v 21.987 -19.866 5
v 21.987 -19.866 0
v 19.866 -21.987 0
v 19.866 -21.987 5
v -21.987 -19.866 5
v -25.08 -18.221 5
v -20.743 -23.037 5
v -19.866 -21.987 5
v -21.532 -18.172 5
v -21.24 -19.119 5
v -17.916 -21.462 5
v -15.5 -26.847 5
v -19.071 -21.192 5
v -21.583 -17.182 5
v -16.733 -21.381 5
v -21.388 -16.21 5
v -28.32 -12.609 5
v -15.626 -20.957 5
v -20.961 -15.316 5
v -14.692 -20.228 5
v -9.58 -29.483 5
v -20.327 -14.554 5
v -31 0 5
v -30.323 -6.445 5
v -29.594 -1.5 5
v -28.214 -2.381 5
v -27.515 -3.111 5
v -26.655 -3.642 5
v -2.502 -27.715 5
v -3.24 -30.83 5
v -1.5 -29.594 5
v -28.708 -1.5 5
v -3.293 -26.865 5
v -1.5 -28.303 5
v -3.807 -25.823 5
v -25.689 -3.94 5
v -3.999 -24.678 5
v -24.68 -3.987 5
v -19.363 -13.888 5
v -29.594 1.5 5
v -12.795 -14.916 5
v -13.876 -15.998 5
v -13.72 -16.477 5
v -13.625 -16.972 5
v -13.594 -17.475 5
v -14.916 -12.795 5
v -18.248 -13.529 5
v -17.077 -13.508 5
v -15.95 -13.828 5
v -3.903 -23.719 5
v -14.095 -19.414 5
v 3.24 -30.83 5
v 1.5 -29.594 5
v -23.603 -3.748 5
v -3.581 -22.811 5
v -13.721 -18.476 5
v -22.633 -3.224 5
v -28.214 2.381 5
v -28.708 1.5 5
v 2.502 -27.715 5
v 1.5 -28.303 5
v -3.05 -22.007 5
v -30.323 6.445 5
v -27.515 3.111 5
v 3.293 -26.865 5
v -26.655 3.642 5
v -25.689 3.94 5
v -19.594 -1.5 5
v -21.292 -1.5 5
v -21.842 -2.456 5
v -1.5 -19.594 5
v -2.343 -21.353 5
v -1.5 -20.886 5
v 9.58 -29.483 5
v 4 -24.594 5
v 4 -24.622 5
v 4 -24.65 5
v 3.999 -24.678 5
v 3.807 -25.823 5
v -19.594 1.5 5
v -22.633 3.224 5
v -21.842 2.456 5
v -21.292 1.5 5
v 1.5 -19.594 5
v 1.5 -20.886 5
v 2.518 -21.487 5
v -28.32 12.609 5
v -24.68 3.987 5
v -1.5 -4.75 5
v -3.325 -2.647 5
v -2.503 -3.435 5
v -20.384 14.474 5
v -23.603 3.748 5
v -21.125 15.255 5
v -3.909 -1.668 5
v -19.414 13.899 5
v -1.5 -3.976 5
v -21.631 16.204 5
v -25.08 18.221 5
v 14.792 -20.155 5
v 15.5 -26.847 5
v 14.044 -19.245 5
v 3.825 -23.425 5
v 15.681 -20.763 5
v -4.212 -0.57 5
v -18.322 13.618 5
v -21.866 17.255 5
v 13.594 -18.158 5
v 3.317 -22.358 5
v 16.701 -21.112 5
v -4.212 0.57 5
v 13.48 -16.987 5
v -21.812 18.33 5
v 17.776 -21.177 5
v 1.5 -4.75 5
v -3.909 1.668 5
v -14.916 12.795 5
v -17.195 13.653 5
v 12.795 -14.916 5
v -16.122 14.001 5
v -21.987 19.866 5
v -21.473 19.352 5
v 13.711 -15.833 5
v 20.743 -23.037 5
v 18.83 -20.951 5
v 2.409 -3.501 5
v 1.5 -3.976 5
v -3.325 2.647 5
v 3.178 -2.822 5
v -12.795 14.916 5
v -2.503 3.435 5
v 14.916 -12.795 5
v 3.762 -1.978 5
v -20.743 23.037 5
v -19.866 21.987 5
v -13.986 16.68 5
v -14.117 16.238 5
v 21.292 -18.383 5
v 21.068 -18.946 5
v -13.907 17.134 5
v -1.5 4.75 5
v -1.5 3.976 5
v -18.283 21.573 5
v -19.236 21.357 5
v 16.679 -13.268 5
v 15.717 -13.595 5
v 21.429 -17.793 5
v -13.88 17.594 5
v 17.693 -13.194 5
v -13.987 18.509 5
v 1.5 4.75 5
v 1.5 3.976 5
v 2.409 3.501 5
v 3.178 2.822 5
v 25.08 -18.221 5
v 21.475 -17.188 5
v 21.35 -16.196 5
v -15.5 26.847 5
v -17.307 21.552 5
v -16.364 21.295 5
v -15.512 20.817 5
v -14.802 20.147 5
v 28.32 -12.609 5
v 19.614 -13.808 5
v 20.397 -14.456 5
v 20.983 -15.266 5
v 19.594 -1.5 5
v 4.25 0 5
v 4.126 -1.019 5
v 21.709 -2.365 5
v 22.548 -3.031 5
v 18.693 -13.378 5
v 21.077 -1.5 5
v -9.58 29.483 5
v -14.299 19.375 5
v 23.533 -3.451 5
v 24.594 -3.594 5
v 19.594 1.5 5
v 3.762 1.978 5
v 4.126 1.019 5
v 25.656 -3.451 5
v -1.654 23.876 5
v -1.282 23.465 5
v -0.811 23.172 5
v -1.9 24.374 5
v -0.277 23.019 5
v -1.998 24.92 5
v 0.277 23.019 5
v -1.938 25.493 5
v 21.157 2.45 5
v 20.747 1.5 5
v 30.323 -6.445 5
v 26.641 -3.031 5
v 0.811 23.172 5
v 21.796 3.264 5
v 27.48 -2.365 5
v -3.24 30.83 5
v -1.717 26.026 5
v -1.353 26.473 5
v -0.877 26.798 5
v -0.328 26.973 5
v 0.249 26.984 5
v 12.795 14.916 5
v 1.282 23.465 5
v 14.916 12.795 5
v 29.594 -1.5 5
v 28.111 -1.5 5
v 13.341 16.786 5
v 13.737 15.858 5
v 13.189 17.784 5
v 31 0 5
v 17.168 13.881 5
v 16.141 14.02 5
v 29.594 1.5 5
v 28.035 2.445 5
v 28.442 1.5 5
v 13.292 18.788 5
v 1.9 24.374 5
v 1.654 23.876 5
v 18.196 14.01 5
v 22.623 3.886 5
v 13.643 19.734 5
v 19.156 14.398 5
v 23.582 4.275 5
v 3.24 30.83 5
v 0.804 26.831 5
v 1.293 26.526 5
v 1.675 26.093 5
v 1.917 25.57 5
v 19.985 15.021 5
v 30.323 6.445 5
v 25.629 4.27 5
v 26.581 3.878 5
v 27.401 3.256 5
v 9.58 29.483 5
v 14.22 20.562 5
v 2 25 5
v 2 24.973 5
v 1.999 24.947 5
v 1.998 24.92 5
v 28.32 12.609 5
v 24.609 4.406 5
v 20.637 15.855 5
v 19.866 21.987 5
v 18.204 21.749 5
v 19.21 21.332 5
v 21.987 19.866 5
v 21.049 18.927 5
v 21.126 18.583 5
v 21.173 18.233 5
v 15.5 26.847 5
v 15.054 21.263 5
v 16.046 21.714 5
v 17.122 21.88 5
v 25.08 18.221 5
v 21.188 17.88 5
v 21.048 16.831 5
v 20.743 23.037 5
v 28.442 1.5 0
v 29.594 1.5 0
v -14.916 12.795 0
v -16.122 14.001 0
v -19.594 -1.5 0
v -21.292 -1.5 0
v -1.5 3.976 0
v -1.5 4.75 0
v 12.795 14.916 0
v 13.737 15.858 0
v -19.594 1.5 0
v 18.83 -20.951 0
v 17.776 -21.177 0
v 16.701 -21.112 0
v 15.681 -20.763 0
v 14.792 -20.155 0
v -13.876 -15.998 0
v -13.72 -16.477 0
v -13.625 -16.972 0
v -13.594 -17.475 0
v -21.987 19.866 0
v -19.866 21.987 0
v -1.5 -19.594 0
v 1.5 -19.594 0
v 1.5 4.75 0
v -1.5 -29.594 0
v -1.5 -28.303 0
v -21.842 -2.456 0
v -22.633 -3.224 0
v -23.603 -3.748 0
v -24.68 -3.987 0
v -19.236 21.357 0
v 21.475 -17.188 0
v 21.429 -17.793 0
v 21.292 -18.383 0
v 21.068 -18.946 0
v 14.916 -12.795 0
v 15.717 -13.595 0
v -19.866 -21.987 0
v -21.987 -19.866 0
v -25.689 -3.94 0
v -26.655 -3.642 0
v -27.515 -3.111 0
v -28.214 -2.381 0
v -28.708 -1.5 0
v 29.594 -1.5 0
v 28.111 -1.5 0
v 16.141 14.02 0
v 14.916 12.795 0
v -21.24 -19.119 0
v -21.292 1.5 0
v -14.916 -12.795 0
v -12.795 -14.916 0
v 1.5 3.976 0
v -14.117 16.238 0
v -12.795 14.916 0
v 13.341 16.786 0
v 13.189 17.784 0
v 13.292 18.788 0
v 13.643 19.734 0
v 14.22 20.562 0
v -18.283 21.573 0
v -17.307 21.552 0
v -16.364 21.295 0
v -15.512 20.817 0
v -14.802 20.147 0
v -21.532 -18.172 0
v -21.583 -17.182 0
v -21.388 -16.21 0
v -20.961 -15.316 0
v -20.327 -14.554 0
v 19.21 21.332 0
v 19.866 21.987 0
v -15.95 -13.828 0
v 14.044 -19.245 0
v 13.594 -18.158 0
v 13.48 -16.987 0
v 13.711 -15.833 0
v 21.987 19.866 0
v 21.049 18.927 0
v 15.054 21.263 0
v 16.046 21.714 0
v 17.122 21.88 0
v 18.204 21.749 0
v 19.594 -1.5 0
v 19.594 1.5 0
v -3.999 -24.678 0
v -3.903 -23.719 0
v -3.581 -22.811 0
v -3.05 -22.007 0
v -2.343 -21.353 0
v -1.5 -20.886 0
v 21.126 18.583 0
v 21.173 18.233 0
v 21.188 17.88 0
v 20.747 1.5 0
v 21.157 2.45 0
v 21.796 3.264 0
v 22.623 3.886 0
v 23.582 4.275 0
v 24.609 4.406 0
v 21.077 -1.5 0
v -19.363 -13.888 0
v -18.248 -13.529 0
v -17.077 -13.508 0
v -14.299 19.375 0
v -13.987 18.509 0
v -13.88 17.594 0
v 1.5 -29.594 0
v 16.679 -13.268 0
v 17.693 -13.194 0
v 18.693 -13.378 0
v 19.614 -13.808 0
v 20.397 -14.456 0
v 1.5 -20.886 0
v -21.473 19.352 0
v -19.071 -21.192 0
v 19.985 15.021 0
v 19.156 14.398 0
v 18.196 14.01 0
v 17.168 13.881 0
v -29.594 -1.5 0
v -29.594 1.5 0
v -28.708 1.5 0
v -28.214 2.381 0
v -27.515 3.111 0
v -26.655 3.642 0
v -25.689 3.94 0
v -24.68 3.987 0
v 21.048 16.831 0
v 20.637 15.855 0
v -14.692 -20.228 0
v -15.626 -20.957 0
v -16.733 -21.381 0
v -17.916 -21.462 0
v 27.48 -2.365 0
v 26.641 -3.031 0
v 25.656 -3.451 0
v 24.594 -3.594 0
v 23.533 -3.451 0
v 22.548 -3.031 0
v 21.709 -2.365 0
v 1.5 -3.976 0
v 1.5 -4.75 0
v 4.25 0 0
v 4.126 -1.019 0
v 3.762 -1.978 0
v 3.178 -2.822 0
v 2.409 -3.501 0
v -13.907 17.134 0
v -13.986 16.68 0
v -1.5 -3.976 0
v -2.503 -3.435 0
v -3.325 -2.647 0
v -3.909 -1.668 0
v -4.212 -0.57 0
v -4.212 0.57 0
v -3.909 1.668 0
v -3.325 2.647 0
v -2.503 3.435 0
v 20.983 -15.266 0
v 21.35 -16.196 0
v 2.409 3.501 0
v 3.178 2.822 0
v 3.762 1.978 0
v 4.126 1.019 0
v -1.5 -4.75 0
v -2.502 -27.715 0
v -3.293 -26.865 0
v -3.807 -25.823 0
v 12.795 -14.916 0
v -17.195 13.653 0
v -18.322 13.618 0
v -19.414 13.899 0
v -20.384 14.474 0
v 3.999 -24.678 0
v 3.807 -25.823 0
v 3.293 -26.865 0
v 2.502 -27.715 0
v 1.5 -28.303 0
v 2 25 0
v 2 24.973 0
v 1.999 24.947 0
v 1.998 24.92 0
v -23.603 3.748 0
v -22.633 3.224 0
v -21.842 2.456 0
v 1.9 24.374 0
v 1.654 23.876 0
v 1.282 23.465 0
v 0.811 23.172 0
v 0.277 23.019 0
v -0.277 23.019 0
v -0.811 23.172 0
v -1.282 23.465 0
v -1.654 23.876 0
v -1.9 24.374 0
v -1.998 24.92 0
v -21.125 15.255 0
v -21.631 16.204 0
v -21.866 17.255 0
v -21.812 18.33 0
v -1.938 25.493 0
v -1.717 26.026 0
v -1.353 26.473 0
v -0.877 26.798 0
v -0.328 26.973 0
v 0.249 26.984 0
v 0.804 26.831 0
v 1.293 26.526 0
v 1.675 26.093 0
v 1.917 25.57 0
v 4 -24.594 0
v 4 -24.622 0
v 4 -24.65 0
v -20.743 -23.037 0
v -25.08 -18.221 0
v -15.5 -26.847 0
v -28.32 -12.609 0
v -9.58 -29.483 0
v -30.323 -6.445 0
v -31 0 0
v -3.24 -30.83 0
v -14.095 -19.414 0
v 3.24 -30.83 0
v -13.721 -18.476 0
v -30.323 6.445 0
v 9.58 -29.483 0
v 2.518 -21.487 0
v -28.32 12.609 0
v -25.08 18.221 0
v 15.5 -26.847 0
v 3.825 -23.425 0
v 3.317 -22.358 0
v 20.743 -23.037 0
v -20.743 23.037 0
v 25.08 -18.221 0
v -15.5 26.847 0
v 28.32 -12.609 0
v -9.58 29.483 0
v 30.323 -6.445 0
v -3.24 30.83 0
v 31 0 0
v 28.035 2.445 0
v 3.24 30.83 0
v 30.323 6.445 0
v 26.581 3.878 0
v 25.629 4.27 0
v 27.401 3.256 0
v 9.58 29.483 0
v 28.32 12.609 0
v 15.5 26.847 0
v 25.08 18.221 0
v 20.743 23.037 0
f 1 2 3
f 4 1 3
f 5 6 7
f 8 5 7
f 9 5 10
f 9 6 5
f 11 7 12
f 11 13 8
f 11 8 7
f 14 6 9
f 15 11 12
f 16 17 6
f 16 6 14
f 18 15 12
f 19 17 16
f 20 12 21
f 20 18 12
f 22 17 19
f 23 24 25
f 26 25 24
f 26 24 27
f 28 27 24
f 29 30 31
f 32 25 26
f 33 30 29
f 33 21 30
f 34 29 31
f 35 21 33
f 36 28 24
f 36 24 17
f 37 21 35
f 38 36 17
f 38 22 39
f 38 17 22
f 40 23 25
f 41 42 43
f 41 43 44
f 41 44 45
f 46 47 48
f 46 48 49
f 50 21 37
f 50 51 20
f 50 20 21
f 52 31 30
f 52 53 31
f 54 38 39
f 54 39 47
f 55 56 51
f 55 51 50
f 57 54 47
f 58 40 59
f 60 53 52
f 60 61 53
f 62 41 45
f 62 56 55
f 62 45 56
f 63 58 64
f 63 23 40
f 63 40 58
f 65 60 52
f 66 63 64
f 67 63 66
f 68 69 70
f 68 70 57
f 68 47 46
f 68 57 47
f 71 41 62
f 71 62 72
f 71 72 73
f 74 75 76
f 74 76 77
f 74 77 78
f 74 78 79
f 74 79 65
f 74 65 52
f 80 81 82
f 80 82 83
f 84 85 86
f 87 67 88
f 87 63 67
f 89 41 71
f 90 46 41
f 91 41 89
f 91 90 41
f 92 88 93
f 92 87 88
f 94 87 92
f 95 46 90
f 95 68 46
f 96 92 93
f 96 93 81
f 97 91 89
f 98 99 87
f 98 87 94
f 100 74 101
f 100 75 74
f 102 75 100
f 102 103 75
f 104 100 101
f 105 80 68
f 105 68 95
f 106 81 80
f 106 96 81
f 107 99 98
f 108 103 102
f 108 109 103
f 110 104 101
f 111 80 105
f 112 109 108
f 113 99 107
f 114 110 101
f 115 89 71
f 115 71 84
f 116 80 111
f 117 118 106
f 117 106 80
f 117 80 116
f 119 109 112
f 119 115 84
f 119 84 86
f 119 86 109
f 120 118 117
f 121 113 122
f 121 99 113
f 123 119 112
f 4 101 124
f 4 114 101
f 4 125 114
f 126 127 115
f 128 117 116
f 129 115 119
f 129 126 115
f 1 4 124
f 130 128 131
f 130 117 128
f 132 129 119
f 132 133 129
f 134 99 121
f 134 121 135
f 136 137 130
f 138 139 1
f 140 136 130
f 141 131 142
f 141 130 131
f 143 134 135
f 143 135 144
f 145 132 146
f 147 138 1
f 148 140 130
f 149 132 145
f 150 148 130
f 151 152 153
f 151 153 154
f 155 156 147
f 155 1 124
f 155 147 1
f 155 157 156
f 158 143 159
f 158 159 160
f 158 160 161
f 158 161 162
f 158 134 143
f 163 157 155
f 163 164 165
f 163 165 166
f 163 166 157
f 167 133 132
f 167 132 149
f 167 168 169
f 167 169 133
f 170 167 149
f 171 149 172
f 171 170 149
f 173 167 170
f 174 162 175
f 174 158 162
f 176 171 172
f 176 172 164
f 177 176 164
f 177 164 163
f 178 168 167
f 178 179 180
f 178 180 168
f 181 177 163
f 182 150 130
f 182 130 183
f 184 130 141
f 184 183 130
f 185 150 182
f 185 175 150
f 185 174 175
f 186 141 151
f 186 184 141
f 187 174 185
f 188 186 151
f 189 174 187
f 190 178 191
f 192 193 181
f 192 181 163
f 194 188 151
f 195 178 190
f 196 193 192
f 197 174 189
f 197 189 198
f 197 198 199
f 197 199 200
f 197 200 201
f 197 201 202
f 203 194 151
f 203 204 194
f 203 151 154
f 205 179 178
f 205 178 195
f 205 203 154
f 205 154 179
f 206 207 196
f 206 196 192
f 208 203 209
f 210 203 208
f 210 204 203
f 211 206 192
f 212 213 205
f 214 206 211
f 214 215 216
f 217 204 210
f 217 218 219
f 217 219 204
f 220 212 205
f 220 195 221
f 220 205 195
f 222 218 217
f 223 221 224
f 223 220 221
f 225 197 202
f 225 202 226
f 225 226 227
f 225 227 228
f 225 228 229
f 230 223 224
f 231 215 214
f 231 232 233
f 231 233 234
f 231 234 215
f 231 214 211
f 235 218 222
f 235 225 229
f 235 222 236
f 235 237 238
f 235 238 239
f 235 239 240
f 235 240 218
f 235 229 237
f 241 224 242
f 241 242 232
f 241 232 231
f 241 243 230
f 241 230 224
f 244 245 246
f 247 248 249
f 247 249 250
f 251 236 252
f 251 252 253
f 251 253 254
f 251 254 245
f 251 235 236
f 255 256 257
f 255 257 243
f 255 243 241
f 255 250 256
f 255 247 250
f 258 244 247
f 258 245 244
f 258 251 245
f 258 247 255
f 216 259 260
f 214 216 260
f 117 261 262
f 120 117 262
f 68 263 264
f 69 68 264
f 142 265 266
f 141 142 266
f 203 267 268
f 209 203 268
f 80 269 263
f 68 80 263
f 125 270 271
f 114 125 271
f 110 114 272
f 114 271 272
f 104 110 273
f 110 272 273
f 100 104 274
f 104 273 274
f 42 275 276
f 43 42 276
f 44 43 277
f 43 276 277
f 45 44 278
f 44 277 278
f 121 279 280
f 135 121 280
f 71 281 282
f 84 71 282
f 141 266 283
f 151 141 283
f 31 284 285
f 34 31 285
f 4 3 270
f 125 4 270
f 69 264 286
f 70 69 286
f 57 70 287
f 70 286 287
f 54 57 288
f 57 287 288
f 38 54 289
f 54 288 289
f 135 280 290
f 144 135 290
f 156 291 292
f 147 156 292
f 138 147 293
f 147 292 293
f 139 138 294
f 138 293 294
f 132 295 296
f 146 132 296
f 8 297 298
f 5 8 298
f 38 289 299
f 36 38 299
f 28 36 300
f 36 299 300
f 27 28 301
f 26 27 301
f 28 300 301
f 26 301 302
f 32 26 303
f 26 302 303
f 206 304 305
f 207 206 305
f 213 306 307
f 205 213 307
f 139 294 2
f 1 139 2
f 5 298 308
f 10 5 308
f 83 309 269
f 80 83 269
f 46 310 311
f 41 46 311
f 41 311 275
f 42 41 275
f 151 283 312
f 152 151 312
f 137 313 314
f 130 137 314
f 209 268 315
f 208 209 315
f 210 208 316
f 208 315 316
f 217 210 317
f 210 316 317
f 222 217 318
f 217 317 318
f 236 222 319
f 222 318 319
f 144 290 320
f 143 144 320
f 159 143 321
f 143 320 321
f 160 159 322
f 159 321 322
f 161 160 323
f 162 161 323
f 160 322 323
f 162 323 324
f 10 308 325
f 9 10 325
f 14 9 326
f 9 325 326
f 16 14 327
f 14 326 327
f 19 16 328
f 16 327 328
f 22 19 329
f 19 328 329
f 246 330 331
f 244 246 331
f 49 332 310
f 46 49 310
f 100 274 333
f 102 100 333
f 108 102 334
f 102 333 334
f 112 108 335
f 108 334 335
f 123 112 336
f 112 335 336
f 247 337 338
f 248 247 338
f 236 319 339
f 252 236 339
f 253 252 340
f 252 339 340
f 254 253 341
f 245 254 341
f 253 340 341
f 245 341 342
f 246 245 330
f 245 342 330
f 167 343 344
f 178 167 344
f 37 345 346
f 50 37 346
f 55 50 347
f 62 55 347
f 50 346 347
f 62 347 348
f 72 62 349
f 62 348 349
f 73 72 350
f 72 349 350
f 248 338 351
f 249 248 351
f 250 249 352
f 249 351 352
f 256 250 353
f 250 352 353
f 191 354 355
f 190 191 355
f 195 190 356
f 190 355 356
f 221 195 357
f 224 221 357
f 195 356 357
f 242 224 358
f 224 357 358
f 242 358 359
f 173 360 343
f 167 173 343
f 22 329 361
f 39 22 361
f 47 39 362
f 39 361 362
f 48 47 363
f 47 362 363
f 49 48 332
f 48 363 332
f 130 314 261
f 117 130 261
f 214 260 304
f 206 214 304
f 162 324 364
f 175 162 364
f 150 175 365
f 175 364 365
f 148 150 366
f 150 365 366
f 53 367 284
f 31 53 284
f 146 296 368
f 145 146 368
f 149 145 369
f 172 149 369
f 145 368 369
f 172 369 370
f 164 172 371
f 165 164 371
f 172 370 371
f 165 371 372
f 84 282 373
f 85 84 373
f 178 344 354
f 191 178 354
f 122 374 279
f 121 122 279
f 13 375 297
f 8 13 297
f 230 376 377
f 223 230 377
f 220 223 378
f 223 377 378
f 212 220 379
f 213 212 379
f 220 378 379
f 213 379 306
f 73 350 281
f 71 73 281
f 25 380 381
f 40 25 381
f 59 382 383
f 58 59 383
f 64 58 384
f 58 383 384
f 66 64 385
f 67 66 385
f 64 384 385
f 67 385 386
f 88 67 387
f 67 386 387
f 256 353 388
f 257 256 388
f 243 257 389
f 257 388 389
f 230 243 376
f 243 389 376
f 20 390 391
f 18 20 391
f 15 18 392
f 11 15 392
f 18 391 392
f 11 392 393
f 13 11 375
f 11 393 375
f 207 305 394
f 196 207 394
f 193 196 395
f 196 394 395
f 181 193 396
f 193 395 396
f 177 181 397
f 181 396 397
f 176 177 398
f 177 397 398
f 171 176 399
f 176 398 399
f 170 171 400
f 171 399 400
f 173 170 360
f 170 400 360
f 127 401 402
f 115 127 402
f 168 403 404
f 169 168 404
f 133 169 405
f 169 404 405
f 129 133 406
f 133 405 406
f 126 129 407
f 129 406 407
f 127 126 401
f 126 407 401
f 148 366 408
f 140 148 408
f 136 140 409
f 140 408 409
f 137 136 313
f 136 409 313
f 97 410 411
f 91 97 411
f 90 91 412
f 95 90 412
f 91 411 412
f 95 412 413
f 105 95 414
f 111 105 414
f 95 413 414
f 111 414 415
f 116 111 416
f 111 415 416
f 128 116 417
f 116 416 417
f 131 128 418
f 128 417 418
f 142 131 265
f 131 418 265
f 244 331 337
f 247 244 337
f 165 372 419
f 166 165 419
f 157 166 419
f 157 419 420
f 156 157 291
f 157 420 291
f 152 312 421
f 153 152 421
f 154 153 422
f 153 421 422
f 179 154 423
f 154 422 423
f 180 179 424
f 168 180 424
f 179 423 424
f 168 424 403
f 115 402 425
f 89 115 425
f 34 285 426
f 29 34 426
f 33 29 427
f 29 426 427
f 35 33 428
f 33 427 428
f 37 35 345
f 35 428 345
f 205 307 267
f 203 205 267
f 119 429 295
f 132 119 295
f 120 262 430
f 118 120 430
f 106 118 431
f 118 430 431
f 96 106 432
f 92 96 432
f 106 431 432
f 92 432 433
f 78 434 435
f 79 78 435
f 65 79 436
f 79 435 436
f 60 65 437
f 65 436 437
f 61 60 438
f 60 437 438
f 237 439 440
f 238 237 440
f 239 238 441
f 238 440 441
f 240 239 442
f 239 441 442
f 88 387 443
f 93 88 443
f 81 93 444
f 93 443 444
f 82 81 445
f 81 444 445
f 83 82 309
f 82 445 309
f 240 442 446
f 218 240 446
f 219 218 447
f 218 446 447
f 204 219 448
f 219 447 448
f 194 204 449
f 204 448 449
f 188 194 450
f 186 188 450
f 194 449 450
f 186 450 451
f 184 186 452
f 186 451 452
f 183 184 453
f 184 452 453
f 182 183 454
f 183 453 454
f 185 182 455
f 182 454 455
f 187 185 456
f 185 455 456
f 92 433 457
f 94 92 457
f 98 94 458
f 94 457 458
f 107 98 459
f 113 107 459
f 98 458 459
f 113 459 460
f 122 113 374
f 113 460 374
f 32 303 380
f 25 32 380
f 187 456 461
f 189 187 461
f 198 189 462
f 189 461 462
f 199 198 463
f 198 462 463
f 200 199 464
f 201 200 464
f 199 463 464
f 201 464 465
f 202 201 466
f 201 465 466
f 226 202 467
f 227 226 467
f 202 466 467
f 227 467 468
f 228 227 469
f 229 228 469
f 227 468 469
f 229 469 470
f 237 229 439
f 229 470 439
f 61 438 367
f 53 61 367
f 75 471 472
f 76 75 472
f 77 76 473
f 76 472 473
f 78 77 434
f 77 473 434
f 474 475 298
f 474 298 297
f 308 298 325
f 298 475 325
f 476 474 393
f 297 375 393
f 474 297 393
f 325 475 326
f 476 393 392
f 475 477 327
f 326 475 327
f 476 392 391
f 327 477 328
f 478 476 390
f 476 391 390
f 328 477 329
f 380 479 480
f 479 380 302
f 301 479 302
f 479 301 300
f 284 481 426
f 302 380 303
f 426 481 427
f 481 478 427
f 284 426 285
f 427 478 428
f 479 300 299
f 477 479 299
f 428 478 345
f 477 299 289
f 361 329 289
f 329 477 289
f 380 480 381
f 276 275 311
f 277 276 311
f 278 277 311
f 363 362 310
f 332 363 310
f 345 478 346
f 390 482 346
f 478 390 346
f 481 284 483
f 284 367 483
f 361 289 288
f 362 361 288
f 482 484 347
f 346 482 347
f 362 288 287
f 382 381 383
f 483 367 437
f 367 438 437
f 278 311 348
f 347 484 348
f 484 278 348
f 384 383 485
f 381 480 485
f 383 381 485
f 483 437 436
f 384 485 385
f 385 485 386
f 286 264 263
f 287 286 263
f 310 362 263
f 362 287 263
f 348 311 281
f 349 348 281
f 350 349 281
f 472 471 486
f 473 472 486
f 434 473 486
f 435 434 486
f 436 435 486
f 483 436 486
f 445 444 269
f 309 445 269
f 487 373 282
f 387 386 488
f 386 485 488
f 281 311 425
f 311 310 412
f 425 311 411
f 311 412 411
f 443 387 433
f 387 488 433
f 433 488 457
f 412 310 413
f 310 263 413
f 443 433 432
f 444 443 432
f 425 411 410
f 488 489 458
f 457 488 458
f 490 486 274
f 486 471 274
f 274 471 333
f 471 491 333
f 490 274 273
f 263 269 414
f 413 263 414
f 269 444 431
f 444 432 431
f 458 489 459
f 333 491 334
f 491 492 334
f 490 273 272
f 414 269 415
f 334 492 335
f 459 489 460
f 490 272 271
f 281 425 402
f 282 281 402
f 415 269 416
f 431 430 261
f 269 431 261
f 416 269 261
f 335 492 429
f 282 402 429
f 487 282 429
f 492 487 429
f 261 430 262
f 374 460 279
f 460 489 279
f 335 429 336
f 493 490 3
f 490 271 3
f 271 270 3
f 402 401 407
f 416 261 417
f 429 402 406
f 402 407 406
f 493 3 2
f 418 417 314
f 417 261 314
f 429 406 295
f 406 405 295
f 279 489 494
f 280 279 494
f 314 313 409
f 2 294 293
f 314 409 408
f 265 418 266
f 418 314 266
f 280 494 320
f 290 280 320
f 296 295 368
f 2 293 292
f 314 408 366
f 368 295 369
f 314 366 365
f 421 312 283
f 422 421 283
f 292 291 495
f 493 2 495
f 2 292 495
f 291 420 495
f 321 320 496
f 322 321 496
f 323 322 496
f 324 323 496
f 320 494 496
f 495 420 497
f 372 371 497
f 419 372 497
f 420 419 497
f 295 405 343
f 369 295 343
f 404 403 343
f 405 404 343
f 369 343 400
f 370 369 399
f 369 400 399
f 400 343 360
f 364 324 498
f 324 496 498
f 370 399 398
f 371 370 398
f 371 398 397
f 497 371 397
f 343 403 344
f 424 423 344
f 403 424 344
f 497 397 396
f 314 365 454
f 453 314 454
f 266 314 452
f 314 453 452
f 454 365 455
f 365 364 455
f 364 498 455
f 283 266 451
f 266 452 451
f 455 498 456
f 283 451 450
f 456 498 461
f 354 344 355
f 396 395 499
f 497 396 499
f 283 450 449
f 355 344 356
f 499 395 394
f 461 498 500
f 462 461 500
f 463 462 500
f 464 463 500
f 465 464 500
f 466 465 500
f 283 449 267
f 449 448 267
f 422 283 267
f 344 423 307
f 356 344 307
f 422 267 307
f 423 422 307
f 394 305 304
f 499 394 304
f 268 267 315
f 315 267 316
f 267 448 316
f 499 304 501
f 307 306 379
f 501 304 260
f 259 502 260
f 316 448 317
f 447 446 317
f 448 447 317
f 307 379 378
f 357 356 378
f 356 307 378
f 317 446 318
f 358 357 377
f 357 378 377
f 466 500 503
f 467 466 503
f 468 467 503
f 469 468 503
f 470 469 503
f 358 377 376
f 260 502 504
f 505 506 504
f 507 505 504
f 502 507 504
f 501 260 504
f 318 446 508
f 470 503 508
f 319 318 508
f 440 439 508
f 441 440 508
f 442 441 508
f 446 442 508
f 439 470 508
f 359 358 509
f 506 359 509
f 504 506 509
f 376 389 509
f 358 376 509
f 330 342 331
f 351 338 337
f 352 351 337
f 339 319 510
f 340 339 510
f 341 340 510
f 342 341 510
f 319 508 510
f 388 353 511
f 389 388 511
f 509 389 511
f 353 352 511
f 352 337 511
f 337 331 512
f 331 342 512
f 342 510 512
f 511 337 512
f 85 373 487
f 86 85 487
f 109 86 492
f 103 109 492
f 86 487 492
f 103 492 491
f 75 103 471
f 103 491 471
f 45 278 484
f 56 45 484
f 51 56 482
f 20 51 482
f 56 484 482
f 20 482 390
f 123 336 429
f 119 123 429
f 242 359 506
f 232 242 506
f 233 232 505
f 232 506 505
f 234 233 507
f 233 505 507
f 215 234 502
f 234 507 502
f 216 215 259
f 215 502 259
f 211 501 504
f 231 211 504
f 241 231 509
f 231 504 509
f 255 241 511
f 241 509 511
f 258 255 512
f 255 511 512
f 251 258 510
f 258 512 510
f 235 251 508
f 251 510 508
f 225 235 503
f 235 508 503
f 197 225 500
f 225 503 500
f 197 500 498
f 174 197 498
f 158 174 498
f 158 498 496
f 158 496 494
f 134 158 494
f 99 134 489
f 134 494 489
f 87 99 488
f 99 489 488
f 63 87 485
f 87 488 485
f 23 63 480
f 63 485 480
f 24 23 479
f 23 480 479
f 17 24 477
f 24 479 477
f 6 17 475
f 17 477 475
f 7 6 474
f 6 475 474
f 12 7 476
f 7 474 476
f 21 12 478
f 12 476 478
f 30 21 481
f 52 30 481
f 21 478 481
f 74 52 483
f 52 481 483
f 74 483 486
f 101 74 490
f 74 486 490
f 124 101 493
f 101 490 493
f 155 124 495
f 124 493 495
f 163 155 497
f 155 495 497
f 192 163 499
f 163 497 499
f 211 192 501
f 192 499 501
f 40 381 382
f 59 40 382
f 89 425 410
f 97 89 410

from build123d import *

# Parameters (mm, degrees)
F0_R     = 31
F1_DEPTH = 5


with BuildPart() as f1:
    # F0 (on Top) → F1 (new body)
    with BuildSketch(Plane.XY):
        Circle(F0_R)
        with BuildLine():
            ThreePointArc((-28.7080992435, 1.5), (-27.1015041114, 3.4034806404), (-24.68, 3.9871794542))
            ThreePointArc((-24.68, 3.9871794542), (-23.1340148639, 9.4772019223), (-20.3839350968, 14.4739486654))
            ThreePointArc((-20.3839350968, 14.4739486654), (-21.7843066075, 16.7218663809), (-21.4732899684, 19.3519696248))
            Line((-21.4732899684, 19.3519696248), (-21.9870643658, 19.8657440223))
            Line((-21.9870643658, 19.8657440223), (-19.8657440223, 21.9870643658))
            Line((-19.8657440223, 21.9870643658), (-19.2357510946, 21.3570714382))
            ThreePointArc((-19.2357510946, 21.3570714382), (-16.8275788969, 21.4526090468), (-14.8016328487, 20.1472495644))
            ThreePointArc((-14.8016328487, 20.1472495644), (-8.7324141696, 23.4253056068), (-1.9983993595, 24.92))
            ThreePointArc((-1.9983993595, 24.92), (-0.0400080056, 26.9995997998), (2, 25))
            ThreePointArc((2, 25), (1.9995997998, 24.9599919944), (1.9983993595, 24.92))
            ThreePointArc((1.9983993595, 24.92), (8.396839067, 23.5476770337), (14.2199501873, 20.5619312485))
            ThreePointArc((14.2199501873, 20.5619312485), (16.578332036, 21.8337211242), (19.2103126472, 21.3316329908))
            Line((19.2103126472, 21.3316329908), (19.8657440223, 21.9870643658))
            Line((19.8657440223, 21.9870643658), (21.9870643658, 19.8657440223))
            Line((21.9870643658, 19.8657440223), (21.048652157, 18.9273318134))
            ThreePointArc((21.048652157, 18.9273318134), (21.1530642912, 18.408521084), (21.1880725996, 17.8804672182))
            ThreePointArc((21.1880725996, 17.8804672182), (20.8749504136, 16.3290382046), (19.9846066074, 15.020502613))
            ThreePointArc((19.9846066074, 15.020502613), (22.9196691944, 9.9844260737), (24.608757715, 4.4055696256))
            ThreePointArc((24.608757715, 4.4055696256), (27.0107687706, 3.5932566366), (28.4417775606, 1.5))
            Line((28.4417775606, 1.5), (29.5944046229, 1.5))
            Line((29.5944046229, 1.5), (29.5944046229, -1.5))
            Line((29.5944046229, -1.5), (28.1113217756, -1.5))
            ThreePointArc((28.1113217756, -1.5), (26.7035545193, -2.9931524386), (24.7406441339, -3.5917304797))
            ThreePointArc((24.7406441339, -3.5917304797), (23.2131665144, -9.2816431936), (20.3965858209, -14.4561158978))
            ThreePointArc((20.3965858209, -14.4561158978), (21.1955475808, -15.7195454325), (21.4748718411, -17.1880725996))
            ThreePointArc((21.4748718411, -17.1880725996), (21.3717482185, -18.0904885234), (21.0676945913, -18.9463742477))
            Line((21.0676945913, -18.9463742477), (21.9870643658, -19.8657440223))
            Line((21.9870643658, -19.8657440223), (19.8657440223, -21.9870643658))
            Line((19.8657440223, -21.9870643658), (18.8301557175, -20.9514760611))
            ThreePointArc((18.8301557175, -20.9514760611), (16.7005194557, -21.1124041838), (14.7916340459, -20.1545915923))
            ThreePointArc((14.7916340459, -20.1545915923), (9.6637784532, -23.0566993737), (3.9991249765, -24.6780671736))
            ThreePointArc((3.9991249765, -24.6780671736), (3.2930577298, -26.865036867), (1.5, -28.3025038665))
            Line((1.5, -28.3025038665), (1.5, -29.5944046229))
            Line((1.5, -29.5944046229), (-1.5, -29.5944046229))
            Line((-1.5, -29.5944046229), (-1.5, -28.3025038665))
            ThreePointArc((-1.5, -28.3025038665), (-3.2930577298, -26.865036867), (-3.9991249765, -24.6780671736))
            ThreePointArc((-3.9991249765, -24.6780671736), (-9.606613518, -23.0805757449), (-14.691565202, -20.2276521602))
            ThreePointArc((-14.691565202, -20.2276521602), (-16.7333297142, -21.3812535524), (-19.0708139147, -21.1921342582))
            Line((-19.0708139147, -21.1921342582), (-19.8657440223, -21.9870643658))
            Line((-19.8657440223, -21.9870643658), (-21.9870643658, -19.8657440223))
            Line((-21.9870643658, -19.8657440223), (-21.2402040172, -19.1188836736))
            ThreePointArc((-21.2402040172, -19.1188836736), (-21.5159012518, -16.6899602951), (-20.326723356, -14.5541855701))
            ThreePointArc((-20.326723356, -14.5541855701), (-23.115291289, -9.522778409), (-24.68, -3.9871794542))
            ThreePointArc((-24.68, -3.9871794542), (-27.1015041114, -3.4034806404), (-28.7080992435, -1.5))
            Line((-28.7080992435, -1.5), (-29.5944046229, -1.5))
            Line((-29.5944046229, -1.5), (-29.5944046229, 1.5))
            Line((-29.5944046229, 1.5), (-28.7080992435, 1.5))
        make_face(mode=Mode.SUBTRACT)
        with BuildLine():
            ThreePointArc((-24.68, 3.9871794542), (-22.6329530448, 3.2244516916), (-21.2919007565, 1.5))
            Line((-21.2919007565, 1.5), (-19.5944046229, 1.5))
            Line((-19.5944046229, 1.5), (-19.5944046229, -1.5))
            Line((-19.5944046229, -1.5), (-21.2919007565, -1.5))
            ThreePointArc((-21.2919007565, -1.5), (-22.6329530448, -3.2244516916), (-24.68, -3.9871794542))
            ThreePointArc((-24.68, -3.9871794542), (-23.115291289, -9.522778409), (-20.326723356, -14.5541855701))
            ThreePointArc((-20.326723356, -14.5541855701), (-18.2480519875, -13.5287621662), (-15.9496561442, -13.8283358006))
            Line((-15.9496561442, -13.8283358006), (-14.915996554, -12.7946762104))
            Line((-14.915996554, -12.7946762104), (-12.7946762104, -14.915996554))
            Line((-12.7946762104, -14.915996554), (-13.8764055595, -15.9977259031))
            ThreePointArc((-13.8764055595, -15.9977259031), (-13.664988194, -16.7228910131), (-13.5936679767, -17.4748718411))
            ThreePointArc((-13.5936679767, -17.4748718411), (-13.8782668477, -18.95669317), (-14.691565202, -20.2276521602))
            ThreePointArc((-14.691565202, -20.2276521602), (-9.606613518, -23.0805757449), (-3.9991249765, -24.6780671736))
            ThreePointArc((-3.9991249765, -24.6780671736), (-3.3398290754, -22.3931454952), (-1.5, -20.8863053794))
            Line((-1.5, -20.8863053794), (-1.5, -19.5944046229))
            Line((-1.5, -19.5944046229), (1.5, -19.5944046229))
            Line((1.5, -19.5944046229), (1.5, -20.8863053794))
            ThreePointArc((1.5, -20.8863053794), (3.3166247904, -22.3583366454), (4, -24.5944046229))
            ThreePointArc((4, -24.5944046229), (3.9997812381, -24.6362381861), (3.9991249765, -24.6780671736))
            ThreePointArc((3.9991249765, -24.6780671736), (9.6637784532, -23.0566993737), (14.7916340459, -20.1545915923))
            ThreePointArc((14.7916340459, -20.1545915923), (13.5942416238, -18.1579742011), (13.7114683796, -15.8327887231))
            Line((13.7114683796, -15.8327887231), (12.7946762104, -14.915996554))
            Line((12.7946762104, -14.915996554), (14.915996554, -12.7946762104))
            Line((14.915996554, -12.7946762104), (15.716570193, -13.5952498494))
            ThreePointArc((15.716570193, -13.5952498494), (18.1985117044, -13.2540739534), (20.3965858209, -14.4561158978))
            ThreePointArc((20.3965858209, -14.4561158978), (23.2131665144, -9.2816431936), (24.7406441339, -3.5917304797))
            ThreePointArc((24.7406441339, -3.5917304797), (22.6109225733, -3.0679905163), (21.0774874702, -1.5))
            Line((21.0774874702, -1.5), (19.5944046229, -1.5))
            Line((19.5944046229, -1.5), (19.5944046229, 1.5))
            Line((19.5944046229, 1.5), (20.7470316853, 1.5))
            ThreePointArc((20.7470316853, 1.5), (22.1894942303, 3.6019066891), (24.608757715, 4.4055696256))
            ThreePointArc((24.608757715, 4.4055696256), (22.9196691944, 9.9844260737), (19.9846066074, 15.020502613))
            ThreePointArc((19.9846066074, 15.020502613), (18.1958639143, 14.0095039446), (16.1412080043, 14.0198876608))
            Line((16.1412080043, 14.0198876608), (14.915996554, 12.7946762104))
            Line((14.915996554, 12.7946762104), (12.7946762104, 14.915996554))
            Line((12.7946762104, 14.915996554), (13.736906827, 15.8582271706))
            ThreePointArc((13.736906827, 15.8582271706), (13.2089994395, 18.2890951502), (14.2199501873, 20.5619312485))
            ThreePointArc((14.2199501873, 20.5619312485), (8.396839067, 23.5476770337), (1.9983993595, 24.92))
            ThreePointArc((1.9983993595, 24.92), (0, 23), (-1.9983993595, 24.92))
            ThreePointArc((-1.9983993595, 24.92), (-8.7324141696, 23.4253056068), (-14.8016328487, 20.1472495644))
            ThreePointArc((-14.8016328487, 20.1472495644), (-14.1177994493, 18.9509930155), (-13.8804672182, 17.5936679767))
            ThreePointArc((-13.8804672182, 17.5936679767), (-13.9400602693, 16.9057776679), (-14.1170637567, 16.2383841002))
            Line((-14.1170637567, 16.2383841002), (-12.7946762104, 14.915996554))
            Line((-12.7946762104, 14.915996554), (-14.915996554, 12.7946762104))
            Line((-14.915996554, 12.7946762104), (-16.12216557, 14.0008452265))
            ThreePointArc((-16.12216557, 14.0008452265), (-18.3218003053, 13.618089389), (-20.3839350968, 14.4739486654))
            ThreePointArc((-20.3839350968, 14.4739486654), (-23.1340148639, 9.4772019223), (-24.68, 3.9871794542))
        make_face()
        with BuildLine():
            ThreePointArc((1.5, 3.9764934301), (3.4955328635, 2.4173849507), (4.25, 0))
            ThreePointArc((4.25, 0), (3.4955328635, -2.4173849507), (1.5, -3.9764934301))
            Line((1.5, -3.9764934301), (1.5, -4.75))
            Line((1.5, -4.75), (-1.5, -4.75))
            Line((-1.5, -4.75), (-1.5, -3.9764934301))
            ThreePointArc((-1.5, -3.9764934301), (-4.25, 0), (-1.5, 3.9764934301))
            Line((-1.5, 3.9764934301), (-1.5, 4.75))
            Line((-1.5, 4.75), (1.5, 4.75))
            Line((1.5, 4.75), (1.5, 3.9764934301))
        make_face(mode=Mode.SUBTRACT)
    extrude(amount=F1_DEPTH)


solid = f1.part
